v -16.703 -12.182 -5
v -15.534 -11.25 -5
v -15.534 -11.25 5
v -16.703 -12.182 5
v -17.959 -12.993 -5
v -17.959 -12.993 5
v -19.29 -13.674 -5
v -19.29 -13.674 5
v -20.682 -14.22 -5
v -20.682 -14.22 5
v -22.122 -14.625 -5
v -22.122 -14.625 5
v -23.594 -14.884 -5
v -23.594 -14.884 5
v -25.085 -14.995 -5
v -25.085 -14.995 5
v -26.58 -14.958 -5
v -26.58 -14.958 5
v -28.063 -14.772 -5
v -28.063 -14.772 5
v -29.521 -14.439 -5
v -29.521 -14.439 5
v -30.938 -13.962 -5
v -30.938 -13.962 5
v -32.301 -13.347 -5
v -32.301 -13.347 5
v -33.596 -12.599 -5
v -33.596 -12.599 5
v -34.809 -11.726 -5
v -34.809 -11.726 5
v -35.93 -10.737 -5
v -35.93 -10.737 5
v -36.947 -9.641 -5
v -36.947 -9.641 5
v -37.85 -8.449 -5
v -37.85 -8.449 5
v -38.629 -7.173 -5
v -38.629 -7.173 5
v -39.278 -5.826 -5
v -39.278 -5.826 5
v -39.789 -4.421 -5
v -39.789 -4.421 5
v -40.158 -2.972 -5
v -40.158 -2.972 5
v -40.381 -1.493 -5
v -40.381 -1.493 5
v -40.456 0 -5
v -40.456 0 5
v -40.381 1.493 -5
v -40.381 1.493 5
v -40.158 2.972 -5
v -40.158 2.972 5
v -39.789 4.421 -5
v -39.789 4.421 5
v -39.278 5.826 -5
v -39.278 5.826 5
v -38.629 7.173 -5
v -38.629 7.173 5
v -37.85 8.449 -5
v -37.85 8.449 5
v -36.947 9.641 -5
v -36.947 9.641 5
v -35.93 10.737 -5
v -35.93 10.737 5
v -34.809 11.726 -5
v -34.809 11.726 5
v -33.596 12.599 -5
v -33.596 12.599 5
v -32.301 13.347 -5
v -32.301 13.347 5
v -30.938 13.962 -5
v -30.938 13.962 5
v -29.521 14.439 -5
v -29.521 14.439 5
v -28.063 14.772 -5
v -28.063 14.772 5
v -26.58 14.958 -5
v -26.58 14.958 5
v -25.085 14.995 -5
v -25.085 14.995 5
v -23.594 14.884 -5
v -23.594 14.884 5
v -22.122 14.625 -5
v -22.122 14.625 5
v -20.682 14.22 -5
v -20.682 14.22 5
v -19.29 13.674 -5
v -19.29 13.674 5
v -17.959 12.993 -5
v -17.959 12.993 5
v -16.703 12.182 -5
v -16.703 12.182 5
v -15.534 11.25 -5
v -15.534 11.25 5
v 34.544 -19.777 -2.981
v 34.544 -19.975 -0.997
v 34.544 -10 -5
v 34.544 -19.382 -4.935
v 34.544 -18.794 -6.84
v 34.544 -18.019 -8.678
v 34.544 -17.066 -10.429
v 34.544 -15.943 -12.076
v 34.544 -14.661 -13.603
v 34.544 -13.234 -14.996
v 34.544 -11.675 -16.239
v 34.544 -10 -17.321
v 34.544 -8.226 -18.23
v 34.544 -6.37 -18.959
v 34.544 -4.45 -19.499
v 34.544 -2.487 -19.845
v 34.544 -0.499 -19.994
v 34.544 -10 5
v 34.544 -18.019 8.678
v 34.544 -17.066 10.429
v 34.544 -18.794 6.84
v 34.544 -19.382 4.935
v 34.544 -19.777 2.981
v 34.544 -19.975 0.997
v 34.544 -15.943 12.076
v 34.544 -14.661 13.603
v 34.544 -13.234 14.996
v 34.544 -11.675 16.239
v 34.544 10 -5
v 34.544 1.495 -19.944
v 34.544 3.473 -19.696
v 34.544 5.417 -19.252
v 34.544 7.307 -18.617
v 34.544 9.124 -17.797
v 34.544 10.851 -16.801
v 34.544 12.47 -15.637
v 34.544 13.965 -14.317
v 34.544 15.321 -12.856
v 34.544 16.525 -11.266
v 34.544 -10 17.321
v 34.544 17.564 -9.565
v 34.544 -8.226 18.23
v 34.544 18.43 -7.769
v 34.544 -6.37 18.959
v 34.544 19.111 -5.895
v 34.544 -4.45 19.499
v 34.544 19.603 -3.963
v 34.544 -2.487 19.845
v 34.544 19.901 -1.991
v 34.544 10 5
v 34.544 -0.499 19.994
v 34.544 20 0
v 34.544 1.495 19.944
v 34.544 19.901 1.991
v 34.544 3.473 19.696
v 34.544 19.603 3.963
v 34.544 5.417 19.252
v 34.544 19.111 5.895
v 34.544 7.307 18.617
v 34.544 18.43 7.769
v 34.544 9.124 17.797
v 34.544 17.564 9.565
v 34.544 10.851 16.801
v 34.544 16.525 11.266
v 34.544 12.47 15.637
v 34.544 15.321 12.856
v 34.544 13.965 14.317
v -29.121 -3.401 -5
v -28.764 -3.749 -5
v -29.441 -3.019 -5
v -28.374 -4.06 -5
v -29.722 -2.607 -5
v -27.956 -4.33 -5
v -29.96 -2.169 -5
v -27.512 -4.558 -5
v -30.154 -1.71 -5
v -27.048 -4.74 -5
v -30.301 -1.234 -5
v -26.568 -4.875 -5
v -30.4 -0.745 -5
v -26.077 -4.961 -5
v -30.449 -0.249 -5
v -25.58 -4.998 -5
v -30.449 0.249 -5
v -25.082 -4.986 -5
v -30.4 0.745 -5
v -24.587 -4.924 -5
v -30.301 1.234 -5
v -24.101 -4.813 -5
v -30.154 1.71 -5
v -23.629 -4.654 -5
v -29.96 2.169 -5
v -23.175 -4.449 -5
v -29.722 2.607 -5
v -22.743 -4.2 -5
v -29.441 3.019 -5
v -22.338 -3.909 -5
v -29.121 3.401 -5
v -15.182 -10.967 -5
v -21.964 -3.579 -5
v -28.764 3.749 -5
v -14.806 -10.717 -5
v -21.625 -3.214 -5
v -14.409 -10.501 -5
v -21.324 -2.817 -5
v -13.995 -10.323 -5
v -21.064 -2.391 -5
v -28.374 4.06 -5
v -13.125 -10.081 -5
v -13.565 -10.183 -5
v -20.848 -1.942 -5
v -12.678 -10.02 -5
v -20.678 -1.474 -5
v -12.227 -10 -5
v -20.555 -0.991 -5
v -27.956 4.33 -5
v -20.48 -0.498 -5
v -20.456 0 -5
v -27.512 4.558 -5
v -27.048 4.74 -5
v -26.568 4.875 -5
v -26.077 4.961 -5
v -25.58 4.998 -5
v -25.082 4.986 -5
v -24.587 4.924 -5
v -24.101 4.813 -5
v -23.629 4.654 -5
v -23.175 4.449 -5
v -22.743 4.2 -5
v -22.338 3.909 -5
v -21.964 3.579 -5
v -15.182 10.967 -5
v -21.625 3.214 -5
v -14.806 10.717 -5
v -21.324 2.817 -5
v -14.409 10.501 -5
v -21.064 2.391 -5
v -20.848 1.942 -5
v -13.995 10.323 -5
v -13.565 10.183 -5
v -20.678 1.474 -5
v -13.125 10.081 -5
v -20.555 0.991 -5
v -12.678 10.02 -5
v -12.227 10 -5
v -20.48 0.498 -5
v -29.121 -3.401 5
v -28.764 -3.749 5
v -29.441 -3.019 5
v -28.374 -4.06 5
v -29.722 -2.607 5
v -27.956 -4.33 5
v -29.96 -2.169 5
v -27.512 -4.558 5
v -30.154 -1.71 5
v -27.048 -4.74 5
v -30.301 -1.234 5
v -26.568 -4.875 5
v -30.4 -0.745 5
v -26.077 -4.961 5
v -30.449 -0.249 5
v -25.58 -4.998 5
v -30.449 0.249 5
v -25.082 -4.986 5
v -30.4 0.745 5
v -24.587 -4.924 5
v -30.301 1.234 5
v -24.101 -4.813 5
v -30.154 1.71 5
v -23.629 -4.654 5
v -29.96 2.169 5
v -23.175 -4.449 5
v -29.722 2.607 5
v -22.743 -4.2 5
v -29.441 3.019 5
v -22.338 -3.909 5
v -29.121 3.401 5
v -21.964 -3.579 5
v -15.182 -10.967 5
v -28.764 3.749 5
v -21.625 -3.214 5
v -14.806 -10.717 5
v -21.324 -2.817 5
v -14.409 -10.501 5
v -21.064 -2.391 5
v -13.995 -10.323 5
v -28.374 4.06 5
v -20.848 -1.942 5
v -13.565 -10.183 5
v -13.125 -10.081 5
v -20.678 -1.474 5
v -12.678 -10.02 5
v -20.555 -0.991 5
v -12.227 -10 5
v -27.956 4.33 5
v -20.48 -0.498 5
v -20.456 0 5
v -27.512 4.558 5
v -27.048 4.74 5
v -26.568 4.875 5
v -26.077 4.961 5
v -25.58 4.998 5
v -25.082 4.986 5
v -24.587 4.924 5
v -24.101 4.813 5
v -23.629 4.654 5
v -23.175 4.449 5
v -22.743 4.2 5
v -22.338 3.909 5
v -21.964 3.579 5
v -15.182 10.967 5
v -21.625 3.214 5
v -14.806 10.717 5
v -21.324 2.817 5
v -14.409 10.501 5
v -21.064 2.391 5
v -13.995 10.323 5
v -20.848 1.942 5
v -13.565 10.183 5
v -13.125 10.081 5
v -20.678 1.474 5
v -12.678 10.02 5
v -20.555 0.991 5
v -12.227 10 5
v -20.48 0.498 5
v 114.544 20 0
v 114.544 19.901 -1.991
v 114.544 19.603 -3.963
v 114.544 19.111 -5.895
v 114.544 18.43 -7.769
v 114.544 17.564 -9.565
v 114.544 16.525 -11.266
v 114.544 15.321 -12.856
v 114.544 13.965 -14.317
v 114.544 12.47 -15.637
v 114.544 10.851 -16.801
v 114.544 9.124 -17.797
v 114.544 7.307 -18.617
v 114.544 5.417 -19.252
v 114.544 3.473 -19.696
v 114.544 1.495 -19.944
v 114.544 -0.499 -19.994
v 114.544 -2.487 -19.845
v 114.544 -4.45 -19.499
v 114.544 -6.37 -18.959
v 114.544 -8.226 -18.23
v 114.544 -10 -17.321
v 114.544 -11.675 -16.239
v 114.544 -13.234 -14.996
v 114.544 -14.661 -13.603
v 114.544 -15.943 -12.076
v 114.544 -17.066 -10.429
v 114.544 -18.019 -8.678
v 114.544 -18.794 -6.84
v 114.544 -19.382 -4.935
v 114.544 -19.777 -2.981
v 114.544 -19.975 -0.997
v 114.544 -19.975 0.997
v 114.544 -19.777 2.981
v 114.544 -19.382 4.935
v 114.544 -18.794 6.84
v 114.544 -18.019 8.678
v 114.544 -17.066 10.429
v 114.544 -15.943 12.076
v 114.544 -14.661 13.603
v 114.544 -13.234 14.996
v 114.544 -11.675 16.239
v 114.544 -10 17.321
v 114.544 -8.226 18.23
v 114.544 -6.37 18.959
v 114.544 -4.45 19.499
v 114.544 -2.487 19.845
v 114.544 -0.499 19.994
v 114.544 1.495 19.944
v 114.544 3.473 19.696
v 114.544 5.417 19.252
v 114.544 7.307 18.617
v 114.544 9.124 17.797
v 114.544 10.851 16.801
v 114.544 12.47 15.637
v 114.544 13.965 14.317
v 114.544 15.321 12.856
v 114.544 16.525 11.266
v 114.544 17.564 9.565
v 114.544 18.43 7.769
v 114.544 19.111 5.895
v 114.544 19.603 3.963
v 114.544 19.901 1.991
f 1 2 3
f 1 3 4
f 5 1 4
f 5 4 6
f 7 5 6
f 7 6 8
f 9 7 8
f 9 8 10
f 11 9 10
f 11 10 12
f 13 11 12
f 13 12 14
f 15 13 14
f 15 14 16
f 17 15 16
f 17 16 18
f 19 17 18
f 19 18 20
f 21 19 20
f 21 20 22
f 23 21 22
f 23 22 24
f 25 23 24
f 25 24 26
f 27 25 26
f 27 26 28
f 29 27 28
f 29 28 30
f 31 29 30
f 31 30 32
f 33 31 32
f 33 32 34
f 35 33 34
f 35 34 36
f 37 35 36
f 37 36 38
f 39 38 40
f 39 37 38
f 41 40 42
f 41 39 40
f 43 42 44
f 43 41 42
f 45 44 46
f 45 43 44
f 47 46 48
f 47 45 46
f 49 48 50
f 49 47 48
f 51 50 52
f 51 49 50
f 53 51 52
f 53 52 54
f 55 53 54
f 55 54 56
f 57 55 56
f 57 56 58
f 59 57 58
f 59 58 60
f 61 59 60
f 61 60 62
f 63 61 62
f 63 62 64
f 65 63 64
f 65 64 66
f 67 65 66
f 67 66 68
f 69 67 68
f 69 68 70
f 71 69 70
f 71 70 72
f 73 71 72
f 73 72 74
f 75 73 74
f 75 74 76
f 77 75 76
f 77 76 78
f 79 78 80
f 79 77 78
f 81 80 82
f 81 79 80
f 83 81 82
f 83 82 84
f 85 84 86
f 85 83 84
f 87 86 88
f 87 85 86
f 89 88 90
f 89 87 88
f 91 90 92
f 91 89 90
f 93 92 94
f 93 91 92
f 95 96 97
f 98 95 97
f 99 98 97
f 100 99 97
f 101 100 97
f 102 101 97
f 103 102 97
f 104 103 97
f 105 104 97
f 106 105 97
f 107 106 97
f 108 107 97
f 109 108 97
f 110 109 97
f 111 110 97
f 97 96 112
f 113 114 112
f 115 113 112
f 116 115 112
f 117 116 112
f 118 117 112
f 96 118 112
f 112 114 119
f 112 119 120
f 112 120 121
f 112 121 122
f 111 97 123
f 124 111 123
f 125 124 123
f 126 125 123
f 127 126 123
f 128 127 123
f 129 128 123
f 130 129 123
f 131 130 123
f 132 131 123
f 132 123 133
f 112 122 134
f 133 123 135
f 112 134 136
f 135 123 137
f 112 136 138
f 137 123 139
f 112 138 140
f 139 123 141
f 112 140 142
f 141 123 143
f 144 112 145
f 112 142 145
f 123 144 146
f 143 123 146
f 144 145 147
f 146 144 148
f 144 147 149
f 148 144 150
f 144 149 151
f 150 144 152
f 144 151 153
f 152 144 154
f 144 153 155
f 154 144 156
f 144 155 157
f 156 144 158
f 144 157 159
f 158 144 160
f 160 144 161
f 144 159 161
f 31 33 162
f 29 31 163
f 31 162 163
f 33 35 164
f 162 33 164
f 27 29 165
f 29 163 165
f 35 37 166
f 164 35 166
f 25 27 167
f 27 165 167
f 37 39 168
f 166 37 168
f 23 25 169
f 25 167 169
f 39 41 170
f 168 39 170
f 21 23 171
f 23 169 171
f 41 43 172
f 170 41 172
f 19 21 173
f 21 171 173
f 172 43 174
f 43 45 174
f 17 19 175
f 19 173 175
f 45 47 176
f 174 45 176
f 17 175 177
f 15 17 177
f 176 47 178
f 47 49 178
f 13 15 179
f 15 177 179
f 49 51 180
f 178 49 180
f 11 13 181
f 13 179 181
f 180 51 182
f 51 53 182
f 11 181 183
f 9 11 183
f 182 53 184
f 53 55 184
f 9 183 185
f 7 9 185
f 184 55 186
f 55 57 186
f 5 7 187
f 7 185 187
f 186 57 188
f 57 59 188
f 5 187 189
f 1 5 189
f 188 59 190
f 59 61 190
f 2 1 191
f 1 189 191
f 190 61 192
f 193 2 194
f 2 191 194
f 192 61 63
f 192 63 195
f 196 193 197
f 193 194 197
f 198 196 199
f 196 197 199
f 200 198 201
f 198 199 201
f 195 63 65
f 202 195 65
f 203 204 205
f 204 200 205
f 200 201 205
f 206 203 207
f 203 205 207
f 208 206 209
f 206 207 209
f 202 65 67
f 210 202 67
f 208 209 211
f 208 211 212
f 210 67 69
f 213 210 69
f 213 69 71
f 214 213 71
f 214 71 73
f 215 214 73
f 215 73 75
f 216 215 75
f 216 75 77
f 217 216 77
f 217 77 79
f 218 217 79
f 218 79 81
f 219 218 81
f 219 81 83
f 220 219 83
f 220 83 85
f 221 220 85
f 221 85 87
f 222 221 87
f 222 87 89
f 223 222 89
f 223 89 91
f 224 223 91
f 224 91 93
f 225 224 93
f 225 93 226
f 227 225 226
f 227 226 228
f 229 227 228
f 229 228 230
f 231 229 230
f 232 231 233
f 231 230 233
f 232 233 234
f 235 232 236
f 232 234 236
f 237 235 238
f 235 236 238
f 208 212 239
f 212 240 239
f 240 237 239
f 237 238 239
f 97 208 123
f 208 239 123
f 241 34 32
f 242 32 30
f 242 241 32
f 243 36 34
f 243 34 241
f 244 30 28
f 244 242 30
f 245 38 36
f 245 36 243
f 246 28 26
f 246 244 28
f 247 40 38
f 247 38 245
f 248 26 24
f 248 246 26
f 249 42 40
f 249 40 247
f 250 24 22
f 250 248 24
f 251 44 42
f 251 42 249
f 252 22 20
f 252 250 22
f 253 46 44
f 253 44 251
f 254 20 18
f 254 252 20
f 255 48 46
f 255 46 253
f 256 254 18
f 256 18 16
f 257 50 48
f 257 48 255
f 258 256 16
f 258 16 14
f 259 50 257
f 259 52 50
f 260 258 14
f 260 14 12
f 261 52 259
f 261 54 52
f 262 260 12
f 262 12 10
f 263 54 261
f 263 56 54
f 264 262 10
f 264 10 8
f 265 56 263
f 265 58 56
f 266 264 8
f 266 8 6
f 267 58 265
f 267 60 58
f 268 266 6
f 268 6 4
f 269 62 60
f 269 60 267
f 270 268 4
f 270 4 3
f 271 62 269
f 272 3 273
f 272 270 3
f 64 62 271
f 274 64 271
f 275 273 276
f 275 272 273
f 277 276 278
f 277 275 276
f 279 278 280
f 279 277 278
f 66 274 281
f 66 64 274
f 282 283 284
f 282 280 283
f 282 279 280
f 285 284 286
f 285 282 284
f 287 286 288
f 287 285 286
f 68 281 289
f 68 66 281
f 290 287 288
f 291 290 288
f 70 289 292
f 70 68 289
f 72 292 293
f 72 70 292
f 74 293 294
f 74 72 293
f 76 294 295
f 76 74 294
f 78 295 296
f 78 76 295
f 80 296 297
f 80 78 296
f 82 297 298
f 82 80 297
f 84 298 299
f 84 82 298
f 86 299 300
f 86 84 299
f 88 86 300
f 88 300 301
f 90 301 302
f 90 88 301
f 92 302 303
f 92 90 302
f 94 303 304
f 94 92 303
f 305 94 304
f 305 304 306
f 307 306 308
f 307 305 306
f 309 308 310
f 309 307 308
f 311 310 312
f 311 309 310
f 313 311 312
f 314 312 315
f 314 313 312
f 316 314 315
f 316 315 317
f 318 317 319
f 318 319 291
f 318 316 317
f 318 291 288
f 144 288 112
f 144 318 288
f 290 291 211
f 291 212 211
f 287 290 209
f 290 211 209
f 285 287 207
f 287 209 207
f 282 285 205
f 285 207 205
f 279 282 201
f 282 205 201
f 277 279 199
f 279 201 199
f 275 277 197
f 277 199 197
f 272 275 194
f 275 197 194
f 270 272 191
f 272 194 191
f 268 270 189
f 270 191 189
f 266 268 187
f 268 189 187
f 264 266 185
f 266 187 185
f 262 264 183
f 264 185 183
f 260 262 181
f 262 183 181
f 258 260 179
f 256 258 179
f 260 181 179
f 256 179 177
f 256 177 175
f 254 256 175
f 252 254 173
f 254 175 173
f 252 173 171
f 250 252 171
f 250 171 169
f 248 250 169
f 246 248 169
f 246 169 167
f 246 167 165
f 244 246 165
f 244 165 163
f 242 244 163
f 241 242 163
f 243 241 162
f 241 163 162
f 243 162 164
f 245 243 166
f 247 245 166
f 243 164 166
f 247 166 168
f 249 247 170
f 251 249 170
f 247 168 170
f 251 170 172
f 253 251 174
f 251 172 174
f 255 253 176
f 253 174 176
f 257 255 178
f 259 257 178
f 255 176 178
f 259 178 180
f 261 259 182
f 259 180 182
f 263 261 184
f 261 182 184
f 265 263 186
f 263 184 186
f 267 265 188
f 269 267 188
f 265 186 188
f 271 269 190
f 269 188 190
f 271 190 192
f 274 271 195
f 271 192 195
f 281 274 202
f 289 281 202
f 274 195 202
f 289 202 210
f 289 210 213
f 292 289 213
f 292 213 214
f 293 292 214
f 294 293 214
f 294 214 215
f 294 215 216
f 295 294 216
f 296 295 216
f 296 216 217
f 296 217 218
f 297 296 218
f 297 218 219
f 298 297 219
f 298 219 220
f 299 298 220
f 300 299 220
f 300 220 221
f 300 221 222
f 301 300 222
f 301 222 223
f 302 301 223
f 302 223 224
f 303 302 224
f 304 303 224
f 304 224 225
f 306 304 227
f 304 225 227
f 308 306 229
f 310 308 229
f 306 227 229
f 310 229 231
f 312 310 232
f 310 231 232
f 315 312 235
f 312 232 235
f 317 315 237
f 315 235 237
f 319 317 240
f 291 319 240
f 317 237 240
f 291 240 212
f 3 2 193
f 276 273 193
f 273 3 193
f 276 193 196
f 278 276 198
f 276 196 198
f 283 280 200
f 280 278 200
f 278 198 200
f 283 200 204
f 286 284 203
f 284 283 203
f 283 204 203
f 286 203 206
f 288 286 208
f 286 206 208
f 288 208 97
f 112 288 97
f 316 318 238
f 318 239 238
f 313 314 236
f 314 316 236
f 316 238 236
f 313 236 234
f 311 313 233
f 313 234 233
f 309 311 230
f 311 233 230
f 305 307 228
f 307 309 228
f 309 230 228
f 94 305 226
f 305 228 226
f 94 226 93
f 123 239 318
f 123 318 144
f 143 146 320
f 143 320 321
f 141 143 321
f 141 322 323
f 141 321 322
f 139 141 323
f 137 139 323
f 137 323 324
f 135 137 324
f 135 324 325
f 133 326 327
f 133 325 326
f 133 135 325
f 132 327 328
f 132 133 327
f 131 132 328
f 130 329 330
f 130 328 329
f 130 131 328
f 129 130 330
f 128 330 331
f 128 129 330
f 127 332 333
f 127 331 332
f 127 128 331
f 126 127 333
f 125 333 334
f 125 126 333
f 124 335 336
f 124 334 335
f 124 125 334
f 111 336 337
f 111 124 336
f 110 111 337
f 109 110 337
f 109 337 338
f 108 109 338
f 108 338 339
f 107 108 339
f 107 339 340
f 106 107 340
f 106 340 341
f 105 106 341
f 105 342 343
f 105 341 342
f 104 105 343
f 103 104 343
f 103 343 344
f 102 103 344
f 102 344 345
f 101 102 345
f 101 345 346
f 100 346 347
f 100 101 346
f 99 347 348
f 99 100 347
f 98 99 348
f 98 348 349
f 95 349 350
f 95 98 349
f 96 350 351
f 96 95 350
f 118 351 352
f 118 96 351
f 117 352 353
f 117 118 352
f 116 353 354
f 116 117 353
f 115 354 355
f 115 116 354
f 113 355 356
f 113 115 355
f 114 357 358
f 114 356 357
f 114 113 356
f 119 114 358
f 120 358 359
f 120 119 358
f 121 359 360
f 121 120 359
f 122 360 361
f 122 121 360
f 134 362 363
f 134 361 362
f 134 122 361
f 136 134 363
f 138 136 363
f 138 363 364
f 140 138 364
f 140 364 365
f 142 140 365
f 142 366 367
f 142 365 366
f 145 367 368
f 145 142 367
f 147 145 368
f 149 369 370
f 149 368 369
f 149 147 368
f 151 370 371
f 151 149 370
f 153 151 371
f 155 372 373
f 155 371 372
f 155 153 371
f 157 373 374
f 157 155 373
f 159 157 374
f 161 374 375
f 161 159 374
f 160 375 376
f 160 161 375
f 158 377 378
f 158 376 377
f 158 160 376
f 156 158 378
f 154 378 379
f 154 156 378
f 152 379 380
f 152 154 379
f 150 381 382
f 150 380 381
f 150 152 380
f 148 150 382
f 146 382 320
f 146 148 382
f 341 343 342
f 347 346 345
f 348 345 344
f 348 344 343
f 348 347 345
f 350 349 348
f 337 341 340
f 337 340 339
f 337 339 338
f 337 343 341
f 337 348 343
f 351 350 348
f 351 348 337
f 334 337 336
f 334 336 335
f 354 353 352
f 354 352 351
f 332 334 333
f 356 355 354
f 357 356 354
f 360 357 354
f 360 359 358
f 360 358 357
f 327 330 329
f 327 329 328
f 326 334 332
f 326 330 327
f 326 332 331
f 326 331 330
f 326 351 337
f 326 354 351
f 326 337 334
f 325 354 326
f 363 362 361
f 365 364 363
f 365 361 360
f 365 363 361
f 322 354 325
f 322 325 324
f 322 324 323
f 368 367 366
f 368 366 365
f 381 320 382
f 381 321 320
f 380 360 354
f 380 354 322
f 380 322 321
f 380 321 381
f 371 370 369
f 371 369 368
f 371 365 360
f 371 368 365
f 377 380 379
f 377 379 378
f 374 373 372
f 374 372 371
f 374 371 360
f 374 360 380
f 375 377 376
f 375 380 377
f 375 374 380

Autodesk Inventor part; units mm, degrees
ref_plane "YZ Plane" through (0, 0, 0) normal (1, 0, 0) x (0, 1, 0)
ref_plane "XZ Plane" through (0, 0, 0) normal (0, 1, 0) x (-1, 0, 0)
ref_plane "XY Plane" through (0, 0, 0) normal (0, 0, 1) x (1, 0, 0)
sketch "Эскиз1" plane through (0, 0, 0) normal (0, 0, 1) x (1, 0, 0)
  line L0 (-12.2268, 10) -> (34.5444, 10)
  line L1 (-55.4556, 0) -> (49.5444, 0) projected
  line L2 (-12.2268, -10) -> (34.5444, -10)
  arc A0 (-15.534, 11.25) -> (-15.534, -11.25) centre (-25.4556, 0) ccw
  circle A1 centre (-25.4556, 0) radius 5
  line L3 (34.5444, 10) -> (34.5444, -10)
  arc A2 (-15.534, 11.25) -> (-12.2268, 10) centre (-12.2268, 15) ccw
  arc A3 (-12.2268, -10) -> (-15.534, -11.25) centre (-12.2268, -15) ccw
  point P0 (0, 0)
  point P1 (-14.2752, 10)
  point P2 (-14.2752, -10)
  dimension "d0" = 15
  dimension "d1" = 20
  dimension "d2" = 10
  dimension "d12" = 5
  dimension "d13" = 60
extrude "Выдавливание1" add sketch "Эскиз1" along normal blind 5 and the other way blind 5 contours L0 L3 L1 A1 A0 A2 | L3 L2 A3 A0 L1 A1
sketch "Эскиз4" plane through (0, 0, 0) normal (0, 0, 1) x (1, 0, 0)
  line L0 (-20.9089, 0) -> (125.4533, 0) projected
  line L1 (34.5444, 10) -> (34.5444, -10) projected
  line L2 (34.5444, 0) -> (114.5444, 0)
  line L3 (114.5444, 0) -> (114.5444, 20)
  line L4 (114.5444, 20) -> (34.5444, 20)
  line L5 (34.5444, 20) -> (34.5444, 0)
  point P0 (0, 0)
  dimension "d7" = 40
  dimension "d8" = 80
revolve "Вращение1" add sketch "Эскиз4" angle 360 about axis through (-10, 0, 0) along (1, 0, 0)
properties part number "поршень" material "Сталь"
